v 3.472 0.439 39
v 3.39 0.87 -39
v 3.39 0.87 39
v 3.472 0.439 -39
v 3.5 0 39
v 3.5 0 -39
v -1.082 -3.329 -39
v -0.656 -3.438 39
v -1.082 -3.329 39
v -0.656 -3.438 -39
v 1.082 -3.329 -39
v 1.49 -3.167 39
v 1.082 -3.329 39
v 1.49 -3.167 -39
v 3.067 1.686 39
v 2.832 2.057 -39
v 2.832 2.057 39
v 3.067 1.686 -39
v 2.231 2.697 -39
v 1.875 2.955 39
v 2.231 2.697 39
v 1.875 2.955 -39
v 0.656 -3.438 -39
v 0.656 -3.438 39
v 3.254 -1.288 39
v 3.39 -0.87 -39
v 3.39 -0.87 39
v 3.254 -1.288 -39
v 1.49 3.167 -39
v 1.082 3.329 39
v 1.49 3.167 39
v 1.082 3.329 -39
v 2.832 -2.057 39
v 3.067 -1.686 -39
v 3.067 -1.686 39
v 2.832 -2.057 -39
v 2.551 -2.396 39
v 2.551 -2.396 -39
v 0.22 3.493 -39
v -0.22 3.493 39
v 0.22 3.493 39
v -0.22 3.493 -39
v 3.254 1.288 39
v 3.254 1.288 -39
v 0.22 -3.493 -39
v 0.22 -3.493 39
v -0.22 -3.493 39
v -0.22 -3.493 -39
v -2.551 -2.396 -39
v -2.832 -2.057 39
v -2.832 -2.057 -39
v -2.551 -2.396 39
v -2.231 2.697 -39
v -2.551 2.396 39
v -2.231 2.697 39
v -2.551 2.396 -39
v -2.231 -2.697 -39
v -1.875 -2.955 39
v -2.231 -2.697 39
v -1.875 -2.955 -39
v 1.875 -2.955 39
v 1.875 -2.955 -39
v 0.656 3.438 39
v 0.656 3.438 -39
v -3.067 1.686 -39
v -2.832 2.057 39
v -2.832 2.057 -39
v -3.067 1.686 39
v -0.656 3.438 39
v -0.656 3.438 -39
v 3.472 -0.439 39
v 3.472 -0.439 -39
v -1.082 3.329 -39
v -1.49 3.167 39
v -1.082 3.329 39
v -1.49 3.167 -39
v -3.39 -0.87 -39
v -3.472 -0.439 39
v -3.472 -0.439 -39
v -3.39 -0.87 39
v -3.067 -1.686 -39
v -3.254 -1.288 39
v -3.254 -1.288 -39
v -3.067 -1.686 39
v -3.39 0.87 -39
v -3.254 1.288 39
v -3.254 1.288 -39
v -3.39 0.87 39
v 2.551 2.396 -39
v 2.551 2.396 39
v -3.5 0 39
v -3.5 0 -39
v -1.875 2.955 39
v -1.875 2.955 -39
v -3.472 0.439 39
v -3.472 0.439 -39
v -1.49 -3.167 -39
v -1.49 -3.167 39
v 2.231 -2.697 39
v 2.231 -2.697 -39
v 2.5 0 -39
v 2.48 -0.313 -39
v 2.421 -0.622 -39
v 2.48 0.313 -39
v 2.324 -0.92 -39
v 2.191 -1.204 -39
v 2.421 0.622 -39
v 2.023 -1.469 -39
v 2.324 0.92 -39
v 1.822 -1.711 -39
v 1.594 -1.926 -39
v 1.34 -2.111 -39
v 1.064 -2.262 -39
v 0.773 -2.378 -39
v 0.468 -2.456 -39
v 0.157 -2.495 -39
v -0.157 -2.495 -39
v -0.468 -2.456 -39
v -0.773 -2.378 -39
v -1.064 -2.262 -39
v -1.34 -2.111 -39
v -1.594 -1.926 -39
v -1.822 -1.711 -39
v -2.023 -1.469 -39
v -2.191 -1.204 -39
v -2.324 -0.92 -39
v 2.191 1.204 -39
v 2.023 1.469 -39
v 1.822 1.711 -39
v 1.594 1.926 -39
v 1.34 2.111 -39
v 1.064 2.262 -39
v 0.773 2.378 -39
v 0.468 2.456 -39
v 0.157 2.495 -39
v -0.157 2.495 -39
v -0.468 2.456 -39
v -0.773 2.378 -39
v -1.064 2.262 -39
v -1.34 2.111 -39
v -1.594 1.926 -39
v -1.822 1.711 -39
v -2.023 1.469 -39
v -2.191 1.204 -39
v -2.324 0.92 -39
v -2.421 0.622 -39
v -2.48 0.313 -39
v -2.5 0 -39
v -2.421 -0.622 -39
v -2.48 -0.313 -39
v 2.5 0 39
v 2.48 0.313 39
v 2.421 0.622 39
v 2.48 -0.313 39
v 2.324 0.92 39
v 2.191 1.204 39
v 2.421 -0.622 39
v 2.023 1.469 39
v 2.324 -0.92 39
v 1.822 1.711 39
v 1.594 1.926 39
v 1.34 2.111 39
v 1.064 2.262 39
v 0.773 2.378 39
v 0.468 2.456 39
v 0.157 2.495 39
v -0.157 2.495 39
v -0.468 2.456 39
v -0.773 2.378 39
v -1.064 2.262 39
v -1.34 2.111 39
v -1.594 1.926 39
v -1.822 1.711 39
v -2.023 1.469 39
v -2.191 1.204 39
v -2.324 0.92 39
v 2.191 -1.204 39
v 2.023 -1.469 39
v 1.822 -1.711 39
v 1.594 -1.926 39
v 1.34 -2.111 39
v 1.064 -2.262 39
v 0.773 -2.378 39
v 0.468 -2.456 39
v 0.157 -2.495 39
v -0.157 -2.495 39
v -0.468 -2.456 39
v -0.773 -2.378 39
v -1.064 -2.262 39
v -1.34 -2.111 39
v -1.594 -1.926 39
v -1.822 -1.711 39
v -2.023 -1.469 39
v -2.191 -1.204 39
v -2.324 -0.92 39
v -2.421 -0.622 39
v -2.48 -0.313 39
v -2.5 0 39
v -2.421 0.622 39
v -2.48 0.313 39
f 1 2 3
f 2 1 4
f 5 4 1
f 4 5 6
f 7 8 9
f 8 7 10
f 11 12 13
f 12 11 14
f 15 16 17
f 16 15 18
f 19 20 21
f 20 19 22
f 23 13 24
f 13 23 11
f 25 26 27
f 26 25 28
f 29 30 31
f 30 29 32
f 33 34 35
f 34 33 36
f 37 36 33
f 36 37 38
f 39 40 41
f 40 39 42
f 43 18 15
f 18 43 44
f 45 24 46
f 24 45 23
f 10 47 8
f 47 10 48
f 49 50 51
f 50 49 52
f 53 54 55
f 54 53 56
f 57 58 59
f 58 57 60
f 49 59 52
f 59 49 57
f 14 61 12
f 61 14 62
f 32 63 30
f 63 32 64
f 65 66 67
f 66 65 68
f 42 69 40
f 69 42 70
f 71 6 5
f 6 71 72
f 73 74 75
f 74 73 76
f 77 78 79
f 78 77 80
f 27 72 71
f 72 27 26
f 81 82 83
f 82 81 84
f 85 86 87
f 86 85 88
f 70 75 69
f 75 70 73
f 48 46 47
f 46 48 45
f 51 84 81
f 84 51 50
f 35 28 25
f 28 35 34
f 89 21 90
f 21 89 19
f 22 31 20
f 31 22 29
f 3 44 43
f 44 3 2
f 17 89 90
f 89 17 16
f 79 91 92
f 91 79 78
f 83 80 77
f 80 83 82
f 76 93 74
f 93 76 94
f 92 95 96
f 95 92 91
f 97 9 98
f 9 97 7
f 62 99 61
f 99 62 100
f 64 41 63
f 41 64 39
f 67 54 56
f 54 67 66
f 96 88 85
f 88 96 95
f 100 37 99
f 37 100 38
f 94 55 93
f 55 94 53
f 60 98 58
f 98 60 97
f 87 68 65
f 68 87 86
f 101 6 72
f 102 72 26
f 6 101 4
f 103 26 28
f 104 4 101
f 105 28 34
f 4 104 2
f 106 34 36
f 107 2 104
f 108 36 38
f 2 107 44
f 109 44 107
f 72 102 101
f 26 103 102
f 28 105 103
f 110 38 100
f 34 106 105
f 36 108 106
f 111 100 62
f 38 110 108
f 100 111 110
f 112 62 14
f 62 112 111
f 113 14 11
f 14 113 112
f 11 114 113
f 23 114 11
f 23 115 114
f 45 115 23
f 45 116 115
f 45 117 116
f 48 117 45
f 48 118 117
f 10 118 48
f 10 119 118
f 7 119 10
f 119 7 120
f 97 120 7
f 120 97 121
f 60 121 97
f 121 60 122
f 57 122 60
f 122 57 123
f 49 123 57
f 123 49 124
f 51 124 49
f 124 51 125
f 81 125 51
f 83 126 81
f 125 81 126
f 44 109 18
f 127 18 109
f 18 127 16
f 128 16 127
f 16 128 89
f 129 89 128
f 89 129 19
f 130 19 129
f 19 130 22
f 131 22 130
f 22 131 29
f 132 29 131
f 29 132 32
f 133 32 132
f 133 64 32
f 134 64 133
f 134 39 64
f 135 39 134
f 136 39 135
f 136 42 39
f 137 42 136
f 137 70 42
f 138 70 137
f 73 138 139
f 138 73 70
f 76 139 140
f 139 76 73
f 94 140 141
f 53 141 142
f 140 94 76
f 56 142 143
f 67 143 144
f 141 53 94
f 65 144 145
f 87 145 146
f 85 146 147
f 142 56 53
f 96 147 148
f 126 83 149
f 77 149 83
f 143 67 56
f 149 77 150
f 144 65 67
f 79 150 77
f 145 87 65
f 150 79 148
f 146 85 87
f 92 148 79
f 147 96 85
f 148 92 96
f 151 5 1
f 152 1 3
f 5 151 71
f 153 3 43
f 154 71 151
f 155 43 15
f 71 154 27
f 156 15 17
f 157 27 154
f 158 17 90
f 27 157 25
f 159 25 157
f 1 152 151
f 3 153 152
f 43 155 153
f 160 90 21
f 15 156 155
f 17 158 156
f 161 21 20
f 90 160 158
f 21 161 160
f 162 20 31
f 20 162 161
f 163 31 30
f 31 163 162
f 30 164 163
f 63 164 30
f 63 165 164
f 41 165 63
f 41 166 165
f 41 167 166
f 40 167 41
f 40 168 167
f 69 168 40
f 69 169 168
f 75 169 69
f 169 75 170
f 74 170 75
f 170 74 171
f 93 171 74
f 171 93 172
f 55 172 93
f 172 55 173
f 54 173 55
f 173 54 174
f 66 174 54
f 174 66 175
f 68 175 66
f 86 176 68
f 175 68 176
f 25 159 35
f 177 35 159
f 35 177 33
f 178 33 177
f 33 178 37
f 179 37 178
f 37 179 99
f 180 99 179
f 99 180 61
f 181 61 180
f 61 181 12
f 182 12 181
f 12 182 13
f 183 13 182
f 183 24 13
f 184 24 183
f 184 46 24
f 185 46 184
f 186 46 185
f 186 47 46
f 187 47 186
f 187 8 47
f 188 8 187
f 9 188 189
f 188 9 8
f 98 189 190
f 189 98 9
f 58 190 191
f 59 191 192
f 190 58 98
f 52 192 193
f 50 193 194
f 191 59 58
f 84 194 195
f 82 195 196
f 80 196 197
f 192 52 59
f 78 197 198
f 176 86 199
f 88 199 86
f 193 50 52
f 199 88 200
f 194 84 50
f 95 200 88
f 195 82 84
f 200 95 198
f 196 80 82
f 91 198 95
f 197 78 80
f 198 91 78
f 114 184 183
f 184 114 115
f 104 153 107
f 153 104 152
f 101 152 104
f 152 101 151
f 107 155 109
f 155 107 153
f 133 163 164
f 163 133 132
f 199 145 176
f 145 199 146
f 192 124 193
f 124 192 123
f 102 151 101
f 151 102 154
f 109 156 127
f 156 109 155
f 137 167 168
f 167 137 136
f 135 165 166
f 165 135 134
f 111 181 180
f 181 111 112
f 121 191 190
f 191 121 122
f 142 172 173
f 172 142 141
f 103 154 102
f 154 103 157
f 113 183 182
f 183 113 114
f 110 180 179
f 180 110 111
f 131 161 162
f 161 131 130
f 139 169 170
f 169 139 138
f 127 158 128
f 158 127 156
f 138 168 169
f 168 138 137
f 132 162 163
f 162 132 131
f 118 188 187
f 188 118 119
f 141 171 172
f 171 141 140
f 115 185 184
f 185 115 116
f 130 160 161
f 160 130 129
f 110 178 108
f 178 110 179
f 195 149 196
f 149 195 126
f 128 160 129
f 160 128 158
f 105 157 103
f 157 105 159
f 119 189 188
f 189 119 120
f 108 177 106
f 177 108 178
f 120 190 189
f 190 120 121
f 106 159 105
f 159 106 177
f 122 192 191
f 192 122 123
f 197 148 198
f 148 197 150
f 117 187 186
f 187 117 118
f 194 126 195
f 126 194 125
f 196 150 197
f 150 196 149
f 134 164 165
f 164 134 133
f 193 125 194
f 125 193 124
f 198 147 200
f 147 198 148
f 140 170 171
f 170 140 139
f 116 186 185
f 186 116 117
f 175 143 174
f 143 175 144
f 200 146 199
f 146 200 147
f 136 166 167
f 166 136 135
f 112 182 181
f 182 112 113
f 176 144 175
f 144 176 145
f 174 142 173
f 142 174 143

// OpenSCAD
$fn = 50;


difference() {
	union() {
		translate(v = [0, 0, -39.0000000000]) {
			cylinder(h = 78, r = 3.5000000000);
		}
	}
	union() {
		translate(v = [0, 0, -100.0000000000]) {
			cylinder(h = 200, r = 2.5000000000);
		}
	}
}
